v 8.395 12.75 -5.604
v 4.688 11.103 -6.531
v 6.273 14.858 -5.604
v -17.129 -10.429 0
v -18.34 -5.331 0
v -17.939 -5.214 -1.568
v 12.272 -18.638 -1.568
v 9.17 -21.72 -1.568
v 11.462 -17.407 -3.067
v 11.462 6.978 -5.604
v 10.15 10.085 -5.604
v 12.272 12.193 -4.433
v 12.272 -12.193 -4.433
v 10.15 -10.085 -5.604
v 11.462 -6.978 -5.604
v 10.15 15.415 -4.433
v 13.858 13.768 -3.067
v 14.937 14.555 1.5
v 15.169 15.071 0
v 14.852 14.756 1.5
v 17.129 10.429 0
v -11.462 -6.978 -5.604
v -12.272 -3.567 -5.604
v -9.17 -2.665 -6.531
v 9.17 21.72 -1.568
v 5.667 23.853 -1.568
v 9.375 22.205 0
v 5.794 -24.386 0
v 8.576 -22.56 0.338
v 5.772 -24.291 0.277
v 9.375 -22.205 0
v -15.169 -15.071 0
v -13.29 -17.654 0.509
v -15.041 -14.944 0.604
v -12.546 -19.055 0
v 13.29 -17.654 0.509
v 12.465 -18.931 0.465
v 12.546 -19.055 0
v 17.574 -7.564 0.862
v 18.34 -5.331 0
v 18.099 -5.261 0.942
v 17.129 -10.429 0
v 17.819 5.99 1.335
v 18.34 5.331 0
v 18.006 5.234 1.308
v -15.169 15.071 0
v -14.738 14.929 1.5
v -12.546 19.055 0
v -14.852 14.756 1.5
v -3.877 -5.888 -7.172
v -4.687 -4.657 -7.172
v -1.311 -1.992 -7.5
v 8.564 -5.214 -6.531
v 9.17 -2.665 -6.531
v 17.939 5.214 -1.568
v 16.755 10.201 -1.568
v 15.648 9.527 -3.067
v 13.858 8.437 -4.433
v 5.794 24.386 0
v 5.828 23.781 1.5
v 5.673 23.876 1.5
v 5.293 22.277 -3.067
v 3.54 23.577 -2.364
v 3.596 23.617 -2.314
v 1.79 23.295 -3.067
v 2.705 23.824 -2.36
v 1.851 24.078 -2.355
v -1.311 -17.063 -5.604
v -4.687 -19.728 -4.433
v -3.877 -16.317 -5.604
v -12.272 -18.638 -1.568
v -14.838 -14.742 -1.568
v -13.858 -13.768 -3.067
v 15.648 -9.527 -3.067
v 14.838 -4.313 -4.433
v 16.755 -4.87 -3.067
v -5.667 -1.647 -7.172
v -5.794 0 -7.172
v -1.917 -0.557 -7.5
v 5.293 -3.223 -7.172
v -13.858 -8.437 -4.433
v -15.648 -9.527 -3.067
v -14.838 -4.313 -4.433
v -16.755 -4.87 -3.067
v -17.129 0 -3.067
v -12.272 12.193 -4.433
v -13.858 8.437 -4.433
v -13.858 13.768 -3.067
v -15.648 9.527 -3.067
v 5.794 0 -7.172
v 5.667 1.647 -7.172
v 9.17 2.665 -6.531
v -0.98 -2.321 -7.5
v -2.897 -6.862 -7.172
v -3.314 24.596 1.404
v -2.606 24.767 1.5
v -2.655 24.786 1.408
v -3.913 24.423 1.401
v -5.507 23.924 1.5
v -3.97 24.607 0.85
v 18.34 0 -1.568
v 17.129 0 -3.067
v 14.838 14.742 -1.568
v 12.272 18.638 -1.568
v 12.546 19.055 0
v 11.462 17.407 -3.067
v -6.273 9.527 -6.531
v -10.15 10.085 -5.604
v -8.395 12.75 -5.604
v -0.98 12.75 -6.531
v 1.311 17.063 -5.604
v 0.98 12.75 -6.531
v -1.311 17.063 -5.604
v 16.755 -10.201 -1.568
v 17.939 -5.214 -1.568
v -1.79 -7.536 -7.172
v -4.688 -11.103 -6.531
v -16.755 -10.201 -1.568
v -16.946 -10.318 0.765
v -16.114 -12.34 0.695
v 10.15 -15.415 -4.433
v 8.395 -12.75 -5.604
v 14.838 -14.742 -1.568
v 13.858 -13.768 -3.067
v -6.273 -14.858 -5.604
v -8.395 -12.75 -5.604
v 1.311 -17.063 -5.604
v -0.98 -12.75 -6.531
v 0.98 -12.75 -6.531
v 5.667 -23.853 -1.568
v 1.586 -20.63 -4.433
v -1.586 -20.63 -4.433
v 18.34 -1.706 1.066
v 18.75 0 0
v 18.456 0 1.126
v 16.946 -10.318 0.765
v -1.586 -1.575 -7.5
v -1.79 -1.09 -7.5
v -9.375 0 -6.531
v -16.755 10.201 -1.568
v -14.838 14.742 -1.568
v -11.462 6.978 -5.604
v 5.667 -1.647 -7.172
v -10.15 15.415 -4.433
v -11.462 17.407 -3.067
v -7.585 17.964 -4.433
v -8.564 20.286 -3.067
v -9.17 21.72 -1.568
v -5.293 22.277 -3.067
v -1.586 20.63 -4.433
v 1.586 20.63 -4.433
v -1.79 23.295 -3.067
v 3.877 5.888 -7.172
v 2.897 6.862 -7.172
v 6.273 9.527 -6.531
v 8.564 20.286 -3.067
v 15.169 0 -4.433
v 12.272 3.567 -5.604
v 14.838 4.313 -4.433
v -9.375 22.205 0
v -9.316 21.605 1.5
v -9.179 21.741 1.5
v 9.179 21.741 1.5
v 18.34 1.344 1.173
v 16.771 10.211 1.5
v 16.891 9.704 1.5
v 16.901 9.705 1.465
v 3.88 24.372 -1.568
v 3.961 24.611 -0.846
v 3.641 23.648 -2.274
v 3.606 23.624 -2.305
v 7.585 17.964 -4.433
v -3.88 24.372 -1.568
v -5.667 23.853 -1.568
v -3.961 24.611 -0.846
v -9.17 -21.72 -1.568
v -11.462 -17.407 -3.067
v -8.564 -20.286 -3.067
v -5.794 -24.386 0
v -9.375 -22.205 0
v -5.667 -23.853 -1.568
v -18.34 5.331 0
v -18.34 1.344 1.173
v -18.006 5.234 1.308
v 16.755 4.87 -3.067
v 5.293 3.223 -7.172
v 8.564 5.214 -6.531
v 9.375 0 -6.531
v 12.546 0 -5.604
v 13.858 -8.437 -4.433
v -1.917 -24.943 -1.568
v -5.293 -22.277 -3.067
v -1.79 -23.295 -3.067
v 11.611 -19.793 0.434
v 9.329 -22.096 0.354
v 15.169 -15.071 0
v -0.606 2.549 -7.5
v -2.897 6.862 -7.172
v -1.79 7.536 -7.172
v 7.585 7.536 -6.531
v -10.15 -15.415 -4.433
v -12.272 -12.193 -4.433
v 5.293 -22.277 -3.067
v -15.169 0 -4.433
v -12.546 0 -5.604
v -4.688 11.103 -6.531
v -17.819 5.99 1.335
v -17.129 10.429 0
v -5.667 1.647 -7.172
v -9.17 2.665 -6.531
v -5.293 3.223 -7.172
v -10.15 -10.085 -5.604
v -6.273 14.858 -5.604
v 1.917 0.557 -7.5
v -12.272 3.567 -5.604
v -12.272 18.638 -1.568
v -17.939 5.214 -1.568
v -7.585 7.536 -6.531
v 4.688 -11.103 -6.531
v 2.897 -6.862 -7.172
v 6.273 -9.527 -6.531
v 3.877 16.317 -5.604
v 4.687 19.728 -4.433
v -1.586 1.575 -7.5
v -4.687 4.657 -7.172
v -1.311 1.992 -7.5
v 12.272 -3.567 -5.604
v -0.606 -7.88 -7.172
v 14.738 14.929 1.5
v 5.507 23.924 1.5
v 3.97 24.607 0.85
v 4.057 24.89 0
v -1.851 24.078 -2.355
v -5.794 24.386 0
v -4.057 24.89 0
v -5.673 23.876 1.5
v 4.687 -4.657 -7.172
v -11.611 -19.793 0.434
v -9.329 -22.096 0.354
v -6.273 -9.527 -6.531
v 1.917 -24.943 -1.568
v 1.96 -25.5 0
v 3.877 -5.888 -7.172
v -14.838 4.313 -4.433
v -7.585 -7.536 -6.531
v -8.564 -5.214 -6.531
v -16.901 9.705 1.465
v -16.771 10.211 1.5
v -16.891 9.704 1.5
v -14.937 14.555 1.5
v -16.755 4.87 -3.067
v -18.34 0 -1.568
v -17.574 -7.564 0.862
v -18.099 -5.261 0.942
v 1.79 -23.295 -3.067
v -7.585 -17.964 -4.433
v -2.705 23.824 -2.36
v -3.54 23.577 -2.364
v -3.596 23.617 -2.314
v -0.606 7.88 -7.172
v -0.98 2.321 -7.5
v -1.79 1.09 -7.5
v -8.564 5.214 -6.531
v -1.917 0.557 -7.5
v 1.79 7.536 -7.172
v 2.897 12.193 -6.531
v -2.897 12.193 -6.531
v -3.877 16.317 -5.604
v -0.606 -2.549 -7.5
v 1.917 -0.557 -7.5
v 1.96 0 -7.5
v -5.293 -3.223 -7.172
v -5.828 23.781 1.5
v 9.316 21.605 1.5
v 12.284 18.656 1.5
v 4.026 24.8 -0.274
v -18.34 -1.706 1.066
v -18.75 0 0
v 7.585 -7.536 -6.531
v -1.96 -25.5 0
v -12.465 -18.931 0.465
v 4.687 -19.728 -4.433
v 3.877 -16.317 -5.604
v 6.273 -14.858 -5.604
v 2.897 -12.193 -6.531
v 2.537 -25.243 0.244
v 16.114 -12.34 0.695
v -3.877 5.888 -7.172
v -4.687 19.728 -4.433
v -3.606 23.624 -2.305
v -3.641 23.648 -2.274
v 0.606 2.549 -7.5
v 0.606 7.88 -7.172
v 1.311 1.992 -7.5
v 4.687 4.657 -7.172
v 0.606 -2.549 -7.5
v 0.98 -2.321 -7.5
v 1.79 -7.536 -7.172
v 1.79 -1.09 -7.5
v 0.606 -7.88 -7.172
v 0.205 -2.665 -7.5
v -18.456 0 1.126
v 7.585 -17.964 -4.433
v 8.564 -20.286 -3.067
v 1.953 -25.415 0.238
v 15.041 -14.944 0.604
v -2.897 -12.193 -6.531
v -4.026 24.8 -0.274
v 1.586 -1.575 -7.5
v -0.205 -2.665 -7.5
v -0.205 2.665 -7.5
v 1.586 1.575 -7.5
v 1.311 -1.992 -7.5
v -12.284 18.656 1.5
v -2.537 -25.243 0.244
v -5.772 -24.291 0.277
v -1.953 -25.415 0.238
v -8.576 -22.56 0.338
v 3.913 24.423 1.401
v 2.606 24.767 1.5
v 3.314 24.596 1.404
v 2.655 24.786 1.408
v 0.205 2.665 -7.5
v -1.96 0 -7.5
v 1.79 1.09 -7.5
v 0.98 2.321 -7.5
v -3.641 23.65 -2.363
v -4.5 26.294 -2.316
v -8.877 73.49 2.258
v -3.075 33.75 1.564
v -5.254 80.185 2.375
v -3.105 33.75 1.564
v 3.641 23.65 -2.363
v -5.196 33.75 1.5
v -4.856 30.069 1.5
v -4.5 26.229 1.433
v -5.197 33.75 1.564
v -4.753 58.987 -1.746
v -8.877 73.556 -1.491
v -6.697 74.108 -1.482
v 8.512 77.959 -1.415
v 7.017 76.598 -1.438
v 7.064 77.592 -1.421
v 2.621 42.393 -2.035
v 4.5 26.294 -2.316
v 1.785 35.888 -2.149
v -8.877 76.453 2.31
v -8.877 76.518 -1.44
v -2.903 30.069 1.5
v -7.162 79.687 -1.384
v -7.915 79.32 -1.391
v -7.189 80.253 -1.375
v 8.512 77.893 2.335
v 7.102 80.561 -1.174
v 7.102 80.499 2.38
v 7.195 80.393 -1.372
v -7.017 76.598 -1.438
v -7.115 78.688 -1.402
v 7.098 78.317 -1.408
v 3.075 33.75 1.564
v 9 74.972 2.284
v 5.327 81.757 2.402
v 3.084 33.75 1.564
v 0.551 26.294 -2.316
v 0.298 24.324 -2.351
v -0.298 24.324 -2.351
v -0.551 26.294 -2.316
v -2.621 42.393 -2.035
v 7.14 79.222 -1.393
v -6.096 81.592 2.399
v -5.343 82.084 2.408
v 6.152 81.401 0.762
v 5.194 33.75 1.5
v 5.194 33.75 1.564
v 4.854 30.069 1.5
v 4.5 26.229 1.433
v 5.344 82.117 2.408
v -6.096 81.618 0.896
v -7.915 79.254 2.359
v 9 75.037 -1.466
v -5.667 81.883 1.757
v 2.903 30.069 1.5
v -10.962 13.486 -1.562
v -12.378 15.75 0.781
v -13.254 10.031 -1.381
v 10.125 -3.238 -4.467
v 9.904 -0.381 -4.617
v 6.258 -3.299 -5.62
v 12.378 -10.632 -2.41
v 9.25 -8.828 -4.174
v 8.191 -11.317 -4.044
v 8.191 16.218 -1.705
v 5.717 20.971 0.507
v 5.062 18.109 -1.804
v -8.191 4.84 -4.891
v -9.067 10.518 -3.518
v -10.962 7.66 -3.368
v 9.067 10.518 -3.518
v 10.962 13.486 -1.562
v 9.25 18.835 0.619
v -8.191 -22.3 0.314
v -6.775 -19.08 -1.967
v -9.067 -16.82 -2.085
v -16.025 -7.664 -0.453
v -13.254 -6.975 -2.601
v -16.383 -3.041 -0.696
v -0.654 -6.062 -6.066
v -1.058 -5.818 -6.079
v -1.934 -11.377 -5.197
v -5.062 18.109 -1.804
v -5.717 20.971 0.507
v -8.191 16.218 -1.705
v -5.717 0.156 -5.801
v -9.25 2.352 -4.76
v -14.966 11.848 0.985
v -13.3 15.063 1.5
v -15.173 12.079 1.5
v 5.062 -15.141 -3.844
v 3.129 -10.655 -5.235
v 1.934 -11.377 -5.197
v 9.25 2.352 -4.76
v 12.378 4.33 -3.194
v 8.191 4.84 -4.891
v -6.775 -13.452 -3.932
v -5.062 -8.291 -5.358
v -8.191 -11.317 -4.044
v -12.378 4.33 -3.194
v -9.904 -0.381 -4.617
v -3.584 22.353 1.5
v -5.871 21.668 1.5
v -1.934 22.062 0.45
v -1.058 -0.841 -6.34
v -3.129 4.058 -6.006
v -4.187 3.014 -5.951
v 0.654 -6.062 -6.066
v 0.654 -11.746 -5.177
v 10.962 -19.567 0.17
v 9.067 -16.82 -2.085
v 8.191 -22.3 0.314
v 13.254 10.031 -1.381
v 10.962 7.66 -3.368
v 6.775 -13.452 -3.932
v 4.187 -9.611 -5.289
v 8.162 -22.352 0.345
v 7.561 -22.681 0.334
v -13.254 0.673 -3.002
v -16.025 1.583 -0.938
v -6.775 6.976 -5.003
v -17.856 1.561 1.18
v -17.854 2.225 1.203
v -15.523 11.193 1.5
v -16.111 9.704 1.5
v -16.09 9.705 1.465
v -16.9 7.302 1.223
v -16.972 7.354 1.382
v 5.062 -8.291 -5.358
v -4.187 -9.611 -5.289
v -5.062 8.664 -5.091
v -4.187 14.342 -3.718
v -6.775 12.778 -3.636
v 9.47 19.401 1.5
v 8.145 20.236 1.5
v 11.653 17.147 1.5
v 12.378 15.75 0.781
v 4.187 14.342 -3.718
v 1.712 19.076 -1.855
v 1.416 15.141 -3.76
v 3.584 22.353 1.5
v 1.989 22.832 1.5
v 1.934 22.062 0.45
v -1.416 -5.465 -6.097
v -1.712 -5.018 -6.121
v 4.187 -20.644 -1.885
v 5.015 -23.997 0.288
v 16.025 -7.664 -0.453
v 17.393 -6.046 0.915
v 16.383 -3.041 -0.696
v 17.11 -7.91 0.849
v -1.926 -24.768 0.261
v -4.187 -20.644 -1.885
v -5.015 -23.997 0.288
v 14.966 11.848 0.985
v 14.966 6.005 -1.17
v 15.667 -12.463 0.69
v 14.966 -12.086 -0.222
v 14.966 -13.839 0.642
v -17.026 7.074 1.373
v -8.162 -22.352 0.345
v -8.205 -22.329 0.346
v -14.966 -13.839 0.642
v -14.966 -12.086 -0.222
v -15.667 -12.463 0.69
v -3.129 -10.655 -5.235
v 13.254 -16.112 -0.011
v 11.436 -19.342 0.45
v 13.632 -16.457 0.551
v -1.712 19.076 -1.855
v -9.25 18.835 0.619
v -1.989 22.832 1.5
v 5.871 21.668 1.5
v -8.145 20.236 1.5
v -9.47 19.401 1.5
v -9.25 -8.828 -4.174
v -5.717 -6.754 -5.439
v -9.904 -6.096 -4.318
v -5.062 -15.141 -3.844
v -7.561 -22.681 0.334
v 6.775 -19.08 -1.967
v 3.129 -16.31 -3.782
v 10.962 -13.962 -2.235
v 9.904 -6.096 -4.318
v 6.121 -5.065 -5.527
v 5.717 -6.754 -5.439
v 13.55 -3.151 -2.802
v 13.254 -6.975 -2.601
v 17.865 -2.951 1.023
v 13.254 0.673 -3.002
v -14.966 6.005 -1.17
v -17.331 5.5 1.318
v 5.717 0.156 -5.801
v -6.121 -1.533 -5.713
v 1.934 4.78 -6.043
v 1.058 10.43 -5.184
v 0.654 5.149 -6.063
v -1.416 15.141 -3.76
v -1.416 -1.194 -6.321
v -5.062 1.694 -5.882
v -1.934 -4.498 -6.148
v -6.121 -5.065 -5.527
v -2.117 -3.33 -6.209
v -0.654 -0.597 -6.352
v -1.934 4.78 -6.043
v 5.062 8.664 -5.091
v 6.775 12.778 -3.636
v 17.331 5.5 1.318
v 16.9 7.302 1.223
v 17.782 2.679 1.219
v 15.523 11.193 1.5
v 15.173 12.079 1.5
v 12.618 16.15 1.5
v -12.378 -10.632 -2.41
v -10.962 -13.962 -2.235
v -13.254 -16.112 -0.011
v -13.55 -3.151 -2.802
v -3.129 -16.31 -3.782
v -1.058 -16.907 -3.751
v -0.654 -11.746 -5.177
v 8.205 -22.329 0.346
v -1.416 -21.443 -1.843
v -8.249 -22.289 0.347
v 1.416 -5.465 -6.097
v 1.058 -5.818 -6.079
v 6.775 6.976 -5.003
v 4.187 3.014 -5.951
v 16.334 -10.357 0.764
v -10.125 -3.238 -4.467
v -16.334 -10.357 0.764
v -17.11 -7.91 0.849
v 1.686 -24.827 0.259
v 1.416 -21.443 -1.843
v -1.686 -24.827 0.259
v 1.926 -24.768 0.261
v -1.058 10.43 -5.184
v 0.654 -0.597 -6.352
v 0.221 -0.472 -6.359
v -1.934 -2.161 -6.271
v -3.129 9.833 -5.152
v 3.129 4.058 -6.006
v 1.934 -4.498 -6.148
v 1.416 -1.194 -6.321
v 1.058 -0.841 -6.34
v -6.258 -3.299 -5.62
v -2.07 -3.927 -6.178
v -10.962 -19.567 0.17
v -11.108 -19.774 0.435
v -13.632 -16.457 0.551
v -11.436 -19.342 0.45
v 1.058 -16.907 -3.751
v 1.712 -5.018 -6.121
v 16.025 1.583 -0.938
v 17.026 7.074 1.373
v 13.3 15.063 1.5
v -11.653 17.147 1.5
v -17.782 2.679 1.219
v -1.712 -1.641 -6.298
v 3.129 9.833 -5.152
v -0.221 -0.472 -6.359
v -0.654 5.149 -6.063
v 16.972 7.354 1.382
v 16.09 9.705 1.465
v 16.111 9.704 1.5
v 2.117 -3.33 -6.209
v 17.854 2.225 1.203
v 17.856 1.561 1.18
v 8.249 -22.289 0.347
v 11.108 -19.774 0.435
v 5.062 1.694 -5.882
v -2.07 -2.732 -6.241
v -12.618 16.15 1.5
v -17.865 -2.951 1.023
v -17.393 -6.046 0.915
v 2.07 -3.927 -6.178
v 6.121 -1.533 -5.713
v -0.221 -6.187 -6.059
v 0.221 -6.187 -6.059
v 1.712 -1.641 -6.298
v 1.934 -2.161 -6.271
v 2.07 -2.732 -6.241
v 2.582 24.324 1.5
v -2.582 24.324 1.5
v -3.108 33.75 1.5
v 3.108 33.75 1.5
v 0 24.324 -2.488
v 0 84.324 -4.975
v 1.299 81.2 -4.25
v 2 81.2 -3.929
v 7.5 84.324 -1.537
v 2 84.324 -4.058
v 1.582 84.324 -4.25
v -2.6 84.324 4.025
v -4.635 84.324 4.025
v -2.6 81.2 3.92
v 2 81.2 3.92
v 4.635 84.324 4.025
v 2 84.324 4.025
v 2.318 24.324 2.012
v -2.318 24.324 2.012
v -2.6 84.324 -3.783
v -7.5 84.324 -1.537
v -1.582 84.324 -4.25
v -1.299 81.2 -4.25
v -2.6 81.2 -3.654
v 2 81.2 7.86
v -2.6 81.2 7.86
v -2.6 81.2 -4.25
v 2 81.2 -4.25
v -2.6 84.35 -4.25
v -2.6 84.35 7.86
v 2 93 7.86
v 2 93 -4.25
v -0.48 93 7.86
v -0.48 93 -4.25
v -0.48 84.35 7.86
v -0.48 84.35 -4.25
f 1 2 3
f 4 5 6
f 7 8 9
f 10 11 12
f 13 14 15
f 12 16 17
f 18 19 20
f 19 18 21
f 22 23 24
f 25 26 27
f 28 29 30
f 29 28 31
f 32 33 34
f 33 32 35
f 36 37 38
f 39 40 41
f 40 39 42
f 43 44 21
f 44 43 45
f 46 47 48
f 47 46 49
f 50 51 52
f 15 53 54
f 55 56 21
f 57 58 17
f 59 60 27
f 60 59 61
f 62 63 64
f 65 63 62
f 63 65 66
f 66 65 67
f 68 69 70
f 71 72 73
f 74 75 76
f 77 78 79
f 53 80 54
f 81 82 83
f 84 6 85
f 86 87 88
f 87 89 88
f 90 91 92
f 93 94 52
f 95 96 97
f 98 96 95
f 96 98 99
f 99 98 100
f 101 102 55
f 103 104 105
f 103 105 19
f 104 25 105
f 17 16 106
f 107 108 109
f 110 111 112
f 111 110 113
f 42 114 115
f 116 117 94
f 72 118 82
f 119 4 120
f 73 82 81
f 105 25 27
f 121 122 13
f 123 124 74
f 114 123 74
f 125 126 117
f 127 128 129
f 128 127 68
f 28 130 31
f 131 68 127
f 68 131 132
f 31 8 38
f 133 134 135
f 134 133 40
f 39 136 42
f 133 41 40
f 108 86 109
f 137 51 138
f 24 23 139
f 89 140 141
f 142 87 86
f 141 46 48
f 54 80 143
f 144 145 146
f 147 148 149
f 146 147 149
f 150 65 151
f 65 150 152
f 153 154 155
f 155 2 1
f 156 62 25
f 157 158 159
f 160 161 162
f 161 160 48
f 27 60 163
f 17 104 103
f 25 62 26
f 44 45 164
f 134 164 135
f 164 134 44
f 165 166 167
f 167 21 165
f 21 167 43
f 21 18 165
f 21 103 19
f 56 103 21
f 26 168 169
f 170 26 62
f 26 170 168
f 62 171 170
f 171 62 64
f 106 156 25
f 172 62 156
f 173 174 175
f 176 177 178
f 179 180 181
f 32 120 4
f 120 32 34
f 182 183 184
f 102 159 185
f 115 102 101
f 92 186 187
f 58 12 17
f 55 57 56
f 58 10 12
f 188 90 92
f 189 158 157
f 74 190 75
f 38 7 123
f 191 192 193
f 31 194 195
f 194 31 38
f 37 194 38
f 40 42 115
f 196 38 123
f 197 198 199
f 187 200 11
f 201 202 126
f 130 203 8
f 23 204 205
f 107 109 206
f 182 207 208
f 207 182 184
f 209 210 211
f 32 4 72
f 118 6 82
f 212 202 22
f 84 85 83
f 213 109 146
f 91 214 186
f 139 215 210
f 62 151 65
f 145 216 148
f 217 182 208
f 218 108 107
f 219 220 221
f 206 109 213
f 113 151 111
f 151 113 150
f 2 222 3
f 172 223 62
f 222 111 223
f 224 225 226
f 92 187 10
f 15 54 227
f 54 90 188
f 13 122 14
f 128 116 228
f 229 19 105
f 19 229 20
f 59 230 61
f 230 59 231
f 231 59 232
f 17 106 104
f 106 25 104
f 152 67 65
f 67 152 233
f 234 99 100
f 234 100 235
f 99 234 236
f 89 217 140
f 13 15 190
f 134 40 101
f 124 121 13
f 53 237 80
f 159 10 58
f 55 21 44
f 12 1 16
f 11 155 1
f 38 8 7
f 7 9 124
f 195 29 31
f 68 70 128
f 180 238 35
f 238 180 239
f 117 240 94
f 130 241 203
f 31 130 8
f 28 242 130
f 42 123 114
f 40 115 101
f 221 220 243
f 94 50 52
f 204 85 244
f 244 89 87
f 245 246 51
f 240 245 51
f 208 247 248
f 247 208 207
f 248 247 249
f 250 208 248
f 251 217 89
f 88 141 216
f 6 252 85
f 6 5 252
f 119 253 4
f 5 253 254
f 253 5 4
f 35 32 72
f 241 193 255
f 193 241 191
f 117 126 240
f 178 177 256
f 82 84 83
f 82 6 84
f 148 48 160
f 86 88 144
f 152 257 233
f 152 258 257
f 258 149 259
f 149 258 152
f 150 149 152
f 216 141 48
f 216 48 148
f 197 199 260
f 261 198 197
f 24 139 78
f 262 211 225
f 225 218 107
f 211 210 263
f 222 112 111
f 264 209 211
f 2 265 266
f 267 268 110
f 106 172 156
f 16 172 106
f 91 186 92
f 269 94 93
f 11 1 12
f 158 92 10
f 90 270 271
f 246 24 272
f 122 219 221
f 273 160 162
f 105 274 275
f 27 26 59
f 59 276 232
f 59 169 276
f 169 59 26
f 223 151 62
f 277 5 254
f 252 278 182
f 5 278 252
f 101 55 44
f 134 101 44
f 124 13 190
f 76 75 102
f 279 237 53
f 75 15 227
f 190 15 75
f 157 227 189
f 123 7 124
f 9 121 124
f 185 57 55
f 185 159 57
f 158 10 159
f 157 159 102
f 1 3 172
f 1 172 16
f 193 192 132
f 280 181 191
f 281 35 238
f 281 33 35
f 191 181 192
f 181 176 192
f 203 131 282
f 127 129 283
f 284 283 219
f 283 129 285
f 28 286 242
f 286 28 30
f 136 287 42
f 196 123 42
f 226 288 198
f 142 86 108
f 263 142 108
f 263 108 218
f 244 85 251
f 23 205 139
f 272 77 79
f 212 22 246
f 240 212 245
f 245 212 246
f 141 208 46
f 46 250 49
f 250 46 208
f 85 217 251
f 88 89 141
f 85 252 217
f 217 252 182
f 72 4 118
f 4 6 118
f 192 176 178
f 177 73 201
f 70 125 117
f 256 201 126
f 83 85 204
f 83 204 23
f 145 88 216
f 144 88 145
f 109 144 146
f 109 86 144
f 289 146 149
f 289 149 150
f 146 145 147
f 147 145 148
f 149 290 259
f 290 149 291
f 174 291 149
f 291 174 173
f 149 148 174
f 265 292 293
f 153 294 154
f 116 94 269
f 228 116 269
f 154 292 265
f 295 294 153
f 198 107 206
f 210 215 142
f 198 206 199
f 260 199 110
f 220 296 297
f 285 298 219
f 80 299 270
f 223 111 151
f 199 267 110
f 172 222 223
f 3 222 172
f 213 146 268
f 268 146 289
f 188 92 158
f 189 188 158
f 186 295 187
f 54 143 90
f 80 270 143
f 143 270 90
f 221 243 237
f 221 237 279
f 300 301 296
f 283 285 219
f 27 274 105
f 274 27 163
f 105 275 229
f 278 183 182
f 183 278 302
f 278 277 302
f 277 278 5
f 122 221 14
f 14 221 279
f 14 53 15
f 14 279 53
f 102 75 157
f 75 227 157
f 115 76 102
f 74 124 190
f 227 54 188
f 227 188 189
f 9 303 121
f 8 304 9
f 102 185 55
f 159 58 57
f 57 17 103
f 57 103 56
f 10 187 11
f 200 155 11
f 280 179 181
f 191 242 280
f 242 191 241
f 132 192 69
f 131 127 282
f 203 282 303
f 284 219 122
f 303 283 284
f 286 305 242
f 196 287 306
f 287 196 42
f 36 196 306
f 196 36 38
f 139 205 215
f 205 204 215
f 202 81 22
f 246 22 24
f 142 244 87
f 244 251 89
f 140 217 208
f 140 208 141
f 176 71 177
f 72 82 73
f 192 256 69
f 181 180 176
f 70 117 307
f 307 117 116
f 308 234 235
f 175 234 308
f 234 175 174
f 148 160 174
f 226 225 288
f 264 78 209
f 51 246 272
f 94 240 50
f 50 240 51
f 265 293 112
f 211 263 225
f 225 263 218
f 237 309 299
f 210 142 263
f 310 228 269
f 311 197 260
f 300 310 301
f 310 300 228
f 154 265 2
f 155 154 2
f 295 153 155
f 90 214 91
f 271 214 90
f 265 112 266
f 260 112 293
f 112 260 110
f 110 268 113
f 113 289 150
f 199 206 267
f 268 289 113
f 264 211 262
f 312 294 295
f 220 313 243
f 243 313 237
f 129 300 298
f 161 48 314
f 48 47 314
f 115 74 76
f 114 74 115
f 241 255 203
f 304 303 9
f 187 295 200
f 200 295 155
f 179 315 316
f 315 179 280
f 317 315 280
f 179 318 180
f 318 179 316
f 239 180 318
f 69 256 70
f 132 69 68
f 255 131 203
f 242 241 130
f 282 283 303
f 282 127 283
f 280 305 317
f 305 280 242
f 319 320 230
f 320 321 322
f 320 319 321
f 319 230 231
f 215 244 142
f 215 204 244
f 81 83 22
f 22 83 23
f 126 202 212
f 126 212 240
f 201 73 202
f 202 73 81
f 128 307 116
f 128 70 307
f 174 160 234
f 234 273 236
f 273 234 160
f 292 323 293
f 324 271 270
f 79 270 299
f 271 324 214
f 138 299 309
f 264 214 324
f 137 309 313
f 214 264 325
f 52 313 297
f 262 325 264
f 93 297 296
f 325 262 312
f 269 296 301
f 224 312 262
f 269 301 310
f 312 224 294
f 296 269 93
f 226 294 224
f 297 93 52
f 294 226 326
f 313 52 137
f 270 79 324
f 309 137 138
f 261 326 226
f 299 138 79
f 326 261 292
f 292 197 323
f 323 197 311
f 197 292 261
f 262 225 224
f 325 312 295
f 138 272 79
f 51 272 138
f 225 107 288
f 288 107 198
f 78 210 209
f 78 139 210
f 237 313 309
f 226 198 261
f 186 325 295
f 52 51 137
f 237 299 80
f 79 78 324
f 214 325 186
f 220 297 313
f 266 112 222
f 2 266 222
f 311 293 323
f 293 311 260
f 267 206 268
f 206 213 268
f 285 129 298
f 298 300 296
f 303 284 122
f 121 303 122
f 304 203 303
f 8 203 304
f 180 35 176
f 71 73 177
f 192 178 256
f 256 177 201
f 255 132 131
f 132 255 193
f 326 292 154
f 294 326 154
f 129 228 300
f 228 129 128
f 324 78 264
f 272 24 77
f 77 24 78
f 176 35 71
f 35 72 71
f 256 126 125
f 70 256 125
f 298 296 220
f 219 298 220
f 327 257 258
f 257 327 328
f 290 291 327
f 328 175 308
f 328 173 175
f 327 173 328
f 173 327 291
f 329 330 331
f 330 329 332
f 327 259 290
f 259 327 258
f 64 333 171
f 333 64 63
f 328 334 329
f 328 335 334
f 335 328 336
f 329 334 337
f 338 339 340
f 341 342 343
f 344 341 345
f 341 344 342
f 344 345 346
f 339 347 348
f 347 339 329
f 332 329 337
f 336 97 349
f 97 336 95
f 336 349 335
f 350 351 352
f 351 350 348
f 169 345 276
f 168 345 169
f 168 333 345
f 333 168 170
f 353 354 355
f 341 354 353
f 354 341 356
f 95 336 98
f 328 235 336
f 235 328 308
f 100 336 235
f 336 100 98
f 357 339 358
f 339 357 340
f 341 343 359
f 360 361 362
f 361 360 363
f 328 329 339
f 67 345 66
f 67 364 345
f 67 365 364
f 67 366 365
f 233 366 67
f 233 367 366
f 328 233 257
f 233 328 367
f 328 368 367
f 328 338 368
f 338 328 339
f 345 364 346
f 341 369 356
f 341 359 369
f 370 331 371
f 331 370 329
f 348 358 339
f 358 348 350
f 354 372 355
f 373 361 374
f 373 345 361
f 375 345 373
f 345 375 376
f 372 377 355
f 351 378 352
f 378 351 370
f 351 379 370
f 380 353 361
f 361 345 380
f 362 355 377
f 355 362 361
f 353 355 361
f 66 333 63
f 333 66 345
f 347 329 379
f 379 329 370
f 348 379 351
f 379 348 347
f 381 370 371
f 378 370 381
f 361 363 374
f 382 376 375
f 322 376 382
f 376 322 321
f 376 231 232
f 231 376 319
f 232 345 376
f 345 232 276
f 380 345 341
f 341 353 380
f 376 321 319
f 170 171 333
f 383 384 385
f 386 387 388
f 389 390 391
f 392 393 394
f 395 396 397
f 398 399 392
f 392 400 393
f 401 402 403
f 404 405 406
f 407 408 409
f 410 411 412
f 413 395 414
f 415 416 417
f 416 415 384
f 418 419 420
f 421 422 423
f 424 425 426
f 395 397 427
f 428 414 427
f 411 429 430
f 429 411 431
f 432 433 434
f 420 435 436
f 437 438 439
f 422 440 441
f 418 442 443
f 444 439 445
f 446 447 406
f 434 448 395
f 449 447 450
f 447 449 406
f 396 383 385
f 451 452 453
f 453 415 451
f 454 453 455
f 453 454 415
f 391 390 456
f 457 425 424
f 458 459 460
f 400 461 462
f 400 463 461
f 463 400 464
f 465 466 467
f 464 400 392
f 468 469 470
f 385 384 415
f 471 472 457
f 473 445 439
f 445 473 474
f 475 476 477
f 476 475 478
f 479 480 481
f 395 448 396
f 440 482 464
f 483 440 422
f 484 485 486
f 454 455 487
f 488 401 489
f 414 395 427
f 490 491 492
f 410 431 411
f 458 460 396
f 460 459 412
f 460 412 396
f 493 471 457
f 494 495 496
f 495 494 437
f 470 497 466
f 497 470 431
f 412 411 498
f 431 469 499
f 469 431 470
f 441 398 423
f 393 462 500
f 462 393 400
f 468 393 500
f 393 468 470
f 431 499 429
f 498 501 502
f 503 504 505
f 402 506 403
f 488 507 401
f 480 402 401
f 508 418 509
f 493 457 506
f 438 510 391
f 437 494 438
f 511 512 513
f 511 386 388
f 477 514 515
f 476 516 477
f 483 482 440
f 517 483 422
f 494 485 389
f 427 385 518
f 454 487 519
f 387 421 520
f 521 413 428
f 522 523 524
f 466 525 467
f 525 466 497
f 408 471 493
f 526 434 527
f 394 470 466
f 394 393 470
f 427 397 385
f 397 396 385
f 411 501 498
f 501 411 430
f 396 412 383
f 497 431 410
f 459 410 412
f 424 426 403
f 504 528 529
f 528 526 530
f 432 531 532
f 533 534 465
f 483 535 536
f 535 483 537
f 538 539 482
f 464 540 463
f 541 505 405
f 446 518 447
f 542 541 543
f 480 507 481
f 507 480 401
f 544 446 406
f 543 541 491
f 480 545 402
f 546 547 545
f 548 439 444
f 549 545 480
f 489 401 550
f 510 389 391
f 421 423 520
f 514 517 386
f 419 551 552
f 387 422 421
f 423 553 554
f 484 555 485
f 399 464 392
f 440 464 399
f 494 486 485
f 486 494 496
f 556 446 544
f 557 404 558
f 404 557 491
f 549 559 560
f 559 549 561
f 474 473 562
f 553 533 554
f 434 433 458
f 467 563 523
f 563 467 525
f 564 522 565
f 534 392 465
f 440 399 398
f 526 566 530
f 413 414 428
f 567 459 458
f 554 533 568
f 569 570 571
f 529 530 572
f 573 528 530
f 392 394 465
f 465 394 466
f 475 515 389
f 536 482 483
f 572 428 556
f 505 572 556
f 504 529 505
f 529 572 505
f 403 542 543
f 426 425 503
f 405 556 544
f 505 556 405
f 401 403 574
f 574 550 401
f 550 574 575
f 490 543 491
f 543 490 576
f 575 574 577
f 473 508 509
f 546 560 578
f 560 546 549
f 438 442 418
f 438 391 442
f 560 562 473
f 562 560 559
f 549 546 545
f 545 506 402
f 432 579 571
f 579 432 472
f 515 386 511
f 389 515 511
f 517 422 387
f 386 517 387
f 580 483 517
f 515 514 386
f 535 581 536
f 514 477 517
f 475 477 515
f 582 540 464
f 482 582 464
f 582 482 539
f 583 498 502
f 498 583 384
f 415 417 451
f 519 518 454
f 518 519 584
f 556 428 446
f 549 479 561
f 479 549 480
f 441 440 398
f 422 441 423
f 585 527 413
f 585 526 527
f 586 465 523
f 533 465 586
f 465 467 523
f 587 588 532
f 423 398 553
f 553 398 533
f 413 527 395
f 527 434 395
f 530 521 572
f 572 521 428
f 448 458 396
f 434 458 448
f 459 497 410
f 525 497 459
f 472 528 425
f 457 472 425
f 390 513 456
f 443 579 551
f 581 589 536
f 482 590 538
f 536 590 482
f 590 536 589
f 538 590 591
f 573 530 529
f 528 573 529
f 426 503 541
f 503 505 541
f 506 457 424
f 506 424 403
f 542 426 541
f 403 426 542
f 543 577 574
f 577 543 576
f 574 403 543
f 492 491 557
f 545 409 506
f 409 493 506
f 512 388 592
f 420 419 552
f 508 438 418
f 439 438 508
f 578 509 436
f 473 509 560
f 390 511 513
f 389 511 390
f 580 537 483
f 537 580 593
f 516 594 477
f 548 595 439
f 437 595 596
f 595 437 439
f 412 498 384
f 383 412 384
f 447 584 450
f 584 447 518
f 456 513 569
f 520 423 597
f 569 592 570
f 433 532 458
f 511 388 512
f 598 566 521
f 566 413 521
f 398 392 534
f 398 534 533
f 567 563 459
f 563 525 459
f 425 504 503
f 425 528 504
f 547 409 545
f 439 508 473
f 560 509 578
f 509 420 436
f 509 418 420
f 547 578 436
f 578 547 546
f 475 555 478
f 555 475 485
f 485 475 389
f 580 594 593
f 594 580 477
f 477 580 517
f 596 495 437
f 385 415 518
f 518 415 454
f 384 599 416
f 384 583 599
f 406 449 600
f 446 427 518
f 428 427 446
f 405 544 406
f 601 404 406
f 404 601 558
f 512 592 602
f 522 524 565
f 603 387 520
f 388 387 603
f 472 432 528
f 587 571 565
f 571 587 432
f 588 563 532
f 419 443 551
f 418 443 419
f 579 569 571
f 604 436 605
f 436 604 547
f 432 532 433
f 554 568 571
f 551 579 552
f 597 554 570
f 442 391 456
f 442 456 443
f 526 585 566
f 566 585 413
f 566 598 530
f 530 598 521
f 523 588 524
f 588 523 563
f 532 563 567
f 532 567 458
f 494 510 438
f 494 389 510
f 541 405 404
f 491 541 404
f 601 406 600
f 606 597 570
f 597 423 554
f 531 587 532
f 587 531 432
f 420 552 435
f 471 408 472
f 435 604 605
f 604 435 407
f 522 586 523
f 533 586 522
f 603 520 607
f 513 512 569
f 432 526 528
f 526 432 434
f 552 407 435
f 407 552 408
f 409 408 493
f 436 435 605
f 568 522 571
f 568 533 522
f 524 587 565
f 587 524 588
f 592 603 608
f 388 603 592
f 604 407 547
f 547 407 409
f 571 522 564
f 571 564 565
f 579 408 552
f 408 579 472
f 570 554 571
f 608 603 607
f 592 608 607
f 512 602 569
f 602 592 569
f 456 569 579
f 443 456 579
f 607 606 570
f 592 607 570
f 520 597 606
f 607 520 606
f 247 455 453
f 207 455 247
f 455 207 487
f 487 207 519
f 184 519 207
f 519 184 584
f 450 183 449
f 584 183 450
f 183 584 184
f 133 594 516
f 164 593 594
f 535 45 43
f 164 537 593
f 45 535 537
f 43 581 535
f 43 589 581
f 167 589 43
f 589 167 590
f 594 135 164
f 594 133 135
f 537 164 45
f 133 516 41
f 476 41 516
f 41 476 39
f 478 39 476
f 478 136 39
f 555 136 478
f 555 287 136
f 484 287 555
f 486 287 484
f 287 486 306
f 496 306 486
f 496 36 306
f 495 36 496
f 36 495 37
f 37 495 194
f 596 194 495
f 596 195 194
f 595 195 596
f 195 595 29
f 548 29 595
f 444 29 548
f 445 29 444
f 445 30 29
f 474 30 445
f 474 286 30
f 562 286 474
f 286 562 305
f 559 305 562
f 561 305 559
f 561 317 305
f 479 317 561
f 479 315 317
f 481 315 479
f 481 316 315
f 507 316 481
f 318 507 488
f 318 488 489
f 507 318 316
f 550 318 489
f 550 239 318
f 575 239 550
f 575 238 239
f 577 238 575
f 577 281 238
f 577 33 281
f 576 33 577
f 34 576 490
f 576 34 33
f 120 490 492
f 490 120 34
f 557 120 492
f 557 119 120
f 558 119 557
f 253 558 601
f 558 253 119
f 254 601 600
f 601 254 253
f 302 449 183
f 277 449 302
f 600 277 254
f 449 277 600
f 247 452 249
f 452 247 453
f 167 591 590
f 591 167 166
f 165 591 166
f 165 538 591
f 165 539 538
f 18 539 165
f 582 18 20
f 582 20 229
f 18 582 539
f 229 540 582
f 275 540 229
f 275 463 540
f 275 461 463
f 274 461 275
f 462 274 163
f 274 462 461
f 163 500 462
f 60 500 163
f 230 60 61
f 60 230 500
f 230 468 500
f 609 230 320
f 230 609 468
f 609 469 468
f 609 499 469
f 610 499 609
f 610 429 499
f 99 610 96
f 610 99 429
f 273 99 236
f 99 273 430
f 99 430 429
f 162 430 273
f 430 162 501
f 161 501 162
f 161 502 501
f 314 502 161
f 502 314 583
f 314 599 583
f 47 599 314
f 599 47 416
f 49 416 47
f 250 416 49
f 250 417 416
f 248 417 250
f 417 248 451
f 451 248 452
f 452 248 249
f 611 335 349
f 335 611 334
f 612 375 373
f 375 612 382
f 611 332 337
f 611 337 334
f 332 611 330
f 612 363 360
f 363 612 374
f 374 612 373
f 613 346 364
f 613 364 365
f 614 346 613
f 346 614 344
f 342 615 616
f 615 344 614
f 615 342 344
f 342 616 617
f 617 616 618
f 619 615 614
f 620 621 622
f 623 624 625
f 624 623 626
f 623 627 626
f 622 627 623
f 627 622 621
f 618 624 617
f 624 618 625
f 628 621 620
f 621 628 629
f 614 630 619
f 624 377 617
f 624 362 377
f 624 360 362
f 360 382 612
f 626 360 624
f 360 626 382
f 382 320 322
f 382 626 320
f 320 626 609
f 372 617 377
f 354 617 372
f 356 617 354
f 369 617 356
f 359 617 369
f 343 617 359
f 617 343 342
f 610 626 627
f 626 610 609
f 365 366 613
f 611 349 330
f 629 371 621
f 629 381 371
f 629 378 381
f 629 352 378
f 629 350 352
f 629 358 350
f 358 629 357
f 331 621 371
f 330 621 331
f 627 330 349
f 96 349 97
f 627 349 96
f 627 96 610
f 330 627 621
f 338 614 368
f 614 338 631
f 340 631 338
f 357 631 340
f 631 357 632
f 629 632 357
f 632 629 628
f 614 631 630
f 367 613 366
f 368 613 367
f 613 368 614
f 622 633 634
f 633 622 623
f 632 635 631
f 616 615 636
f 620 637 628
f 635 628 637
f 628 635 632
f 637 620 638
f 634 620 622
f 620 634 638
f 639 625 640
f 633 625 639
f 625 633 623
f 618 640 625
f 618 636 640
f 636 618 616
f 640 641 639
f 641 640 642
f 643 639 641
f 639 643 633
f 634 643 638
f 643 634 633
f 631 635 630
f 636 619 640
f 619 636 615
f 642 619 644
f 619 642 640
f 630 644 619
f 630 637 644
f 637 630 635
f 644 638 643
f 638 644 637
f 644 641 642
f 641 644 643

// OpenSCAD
module spoon(){difference(){positive();rotate([357,0,0])translate([0,-2,4.75])resize(newsize=[27,36.5,18])sphere(25);rotate([2,0,0])translate([0,-16,2.75])cube([35,45,4],center=true);translate([0,0,3])cube([35,45,4],center=true);}


resize(newsize=[10,40,6])translate([0,52,0])rotate([0,90,270])cylinder(37,4,2,$fn=5);}

scale(1.5)spoon();

module positive(){
resize(newsize=[25,34,10])sphere(25);
rotate([1,0,0])
translate([0,0,-1.85])
linear_extrude(height=2.5)
hull(){translate([0,17.5,0])circle(3); 
translate([0,50,0])circle(6);}}

translate([2,93,-4.25])rotate([90,0,270])usb();


module usb(){

difference(){

cube ([11.8,12.11,4.6]);

translate([0,0,2.48])
cube([8.65,12.11,2.12]);

}}
